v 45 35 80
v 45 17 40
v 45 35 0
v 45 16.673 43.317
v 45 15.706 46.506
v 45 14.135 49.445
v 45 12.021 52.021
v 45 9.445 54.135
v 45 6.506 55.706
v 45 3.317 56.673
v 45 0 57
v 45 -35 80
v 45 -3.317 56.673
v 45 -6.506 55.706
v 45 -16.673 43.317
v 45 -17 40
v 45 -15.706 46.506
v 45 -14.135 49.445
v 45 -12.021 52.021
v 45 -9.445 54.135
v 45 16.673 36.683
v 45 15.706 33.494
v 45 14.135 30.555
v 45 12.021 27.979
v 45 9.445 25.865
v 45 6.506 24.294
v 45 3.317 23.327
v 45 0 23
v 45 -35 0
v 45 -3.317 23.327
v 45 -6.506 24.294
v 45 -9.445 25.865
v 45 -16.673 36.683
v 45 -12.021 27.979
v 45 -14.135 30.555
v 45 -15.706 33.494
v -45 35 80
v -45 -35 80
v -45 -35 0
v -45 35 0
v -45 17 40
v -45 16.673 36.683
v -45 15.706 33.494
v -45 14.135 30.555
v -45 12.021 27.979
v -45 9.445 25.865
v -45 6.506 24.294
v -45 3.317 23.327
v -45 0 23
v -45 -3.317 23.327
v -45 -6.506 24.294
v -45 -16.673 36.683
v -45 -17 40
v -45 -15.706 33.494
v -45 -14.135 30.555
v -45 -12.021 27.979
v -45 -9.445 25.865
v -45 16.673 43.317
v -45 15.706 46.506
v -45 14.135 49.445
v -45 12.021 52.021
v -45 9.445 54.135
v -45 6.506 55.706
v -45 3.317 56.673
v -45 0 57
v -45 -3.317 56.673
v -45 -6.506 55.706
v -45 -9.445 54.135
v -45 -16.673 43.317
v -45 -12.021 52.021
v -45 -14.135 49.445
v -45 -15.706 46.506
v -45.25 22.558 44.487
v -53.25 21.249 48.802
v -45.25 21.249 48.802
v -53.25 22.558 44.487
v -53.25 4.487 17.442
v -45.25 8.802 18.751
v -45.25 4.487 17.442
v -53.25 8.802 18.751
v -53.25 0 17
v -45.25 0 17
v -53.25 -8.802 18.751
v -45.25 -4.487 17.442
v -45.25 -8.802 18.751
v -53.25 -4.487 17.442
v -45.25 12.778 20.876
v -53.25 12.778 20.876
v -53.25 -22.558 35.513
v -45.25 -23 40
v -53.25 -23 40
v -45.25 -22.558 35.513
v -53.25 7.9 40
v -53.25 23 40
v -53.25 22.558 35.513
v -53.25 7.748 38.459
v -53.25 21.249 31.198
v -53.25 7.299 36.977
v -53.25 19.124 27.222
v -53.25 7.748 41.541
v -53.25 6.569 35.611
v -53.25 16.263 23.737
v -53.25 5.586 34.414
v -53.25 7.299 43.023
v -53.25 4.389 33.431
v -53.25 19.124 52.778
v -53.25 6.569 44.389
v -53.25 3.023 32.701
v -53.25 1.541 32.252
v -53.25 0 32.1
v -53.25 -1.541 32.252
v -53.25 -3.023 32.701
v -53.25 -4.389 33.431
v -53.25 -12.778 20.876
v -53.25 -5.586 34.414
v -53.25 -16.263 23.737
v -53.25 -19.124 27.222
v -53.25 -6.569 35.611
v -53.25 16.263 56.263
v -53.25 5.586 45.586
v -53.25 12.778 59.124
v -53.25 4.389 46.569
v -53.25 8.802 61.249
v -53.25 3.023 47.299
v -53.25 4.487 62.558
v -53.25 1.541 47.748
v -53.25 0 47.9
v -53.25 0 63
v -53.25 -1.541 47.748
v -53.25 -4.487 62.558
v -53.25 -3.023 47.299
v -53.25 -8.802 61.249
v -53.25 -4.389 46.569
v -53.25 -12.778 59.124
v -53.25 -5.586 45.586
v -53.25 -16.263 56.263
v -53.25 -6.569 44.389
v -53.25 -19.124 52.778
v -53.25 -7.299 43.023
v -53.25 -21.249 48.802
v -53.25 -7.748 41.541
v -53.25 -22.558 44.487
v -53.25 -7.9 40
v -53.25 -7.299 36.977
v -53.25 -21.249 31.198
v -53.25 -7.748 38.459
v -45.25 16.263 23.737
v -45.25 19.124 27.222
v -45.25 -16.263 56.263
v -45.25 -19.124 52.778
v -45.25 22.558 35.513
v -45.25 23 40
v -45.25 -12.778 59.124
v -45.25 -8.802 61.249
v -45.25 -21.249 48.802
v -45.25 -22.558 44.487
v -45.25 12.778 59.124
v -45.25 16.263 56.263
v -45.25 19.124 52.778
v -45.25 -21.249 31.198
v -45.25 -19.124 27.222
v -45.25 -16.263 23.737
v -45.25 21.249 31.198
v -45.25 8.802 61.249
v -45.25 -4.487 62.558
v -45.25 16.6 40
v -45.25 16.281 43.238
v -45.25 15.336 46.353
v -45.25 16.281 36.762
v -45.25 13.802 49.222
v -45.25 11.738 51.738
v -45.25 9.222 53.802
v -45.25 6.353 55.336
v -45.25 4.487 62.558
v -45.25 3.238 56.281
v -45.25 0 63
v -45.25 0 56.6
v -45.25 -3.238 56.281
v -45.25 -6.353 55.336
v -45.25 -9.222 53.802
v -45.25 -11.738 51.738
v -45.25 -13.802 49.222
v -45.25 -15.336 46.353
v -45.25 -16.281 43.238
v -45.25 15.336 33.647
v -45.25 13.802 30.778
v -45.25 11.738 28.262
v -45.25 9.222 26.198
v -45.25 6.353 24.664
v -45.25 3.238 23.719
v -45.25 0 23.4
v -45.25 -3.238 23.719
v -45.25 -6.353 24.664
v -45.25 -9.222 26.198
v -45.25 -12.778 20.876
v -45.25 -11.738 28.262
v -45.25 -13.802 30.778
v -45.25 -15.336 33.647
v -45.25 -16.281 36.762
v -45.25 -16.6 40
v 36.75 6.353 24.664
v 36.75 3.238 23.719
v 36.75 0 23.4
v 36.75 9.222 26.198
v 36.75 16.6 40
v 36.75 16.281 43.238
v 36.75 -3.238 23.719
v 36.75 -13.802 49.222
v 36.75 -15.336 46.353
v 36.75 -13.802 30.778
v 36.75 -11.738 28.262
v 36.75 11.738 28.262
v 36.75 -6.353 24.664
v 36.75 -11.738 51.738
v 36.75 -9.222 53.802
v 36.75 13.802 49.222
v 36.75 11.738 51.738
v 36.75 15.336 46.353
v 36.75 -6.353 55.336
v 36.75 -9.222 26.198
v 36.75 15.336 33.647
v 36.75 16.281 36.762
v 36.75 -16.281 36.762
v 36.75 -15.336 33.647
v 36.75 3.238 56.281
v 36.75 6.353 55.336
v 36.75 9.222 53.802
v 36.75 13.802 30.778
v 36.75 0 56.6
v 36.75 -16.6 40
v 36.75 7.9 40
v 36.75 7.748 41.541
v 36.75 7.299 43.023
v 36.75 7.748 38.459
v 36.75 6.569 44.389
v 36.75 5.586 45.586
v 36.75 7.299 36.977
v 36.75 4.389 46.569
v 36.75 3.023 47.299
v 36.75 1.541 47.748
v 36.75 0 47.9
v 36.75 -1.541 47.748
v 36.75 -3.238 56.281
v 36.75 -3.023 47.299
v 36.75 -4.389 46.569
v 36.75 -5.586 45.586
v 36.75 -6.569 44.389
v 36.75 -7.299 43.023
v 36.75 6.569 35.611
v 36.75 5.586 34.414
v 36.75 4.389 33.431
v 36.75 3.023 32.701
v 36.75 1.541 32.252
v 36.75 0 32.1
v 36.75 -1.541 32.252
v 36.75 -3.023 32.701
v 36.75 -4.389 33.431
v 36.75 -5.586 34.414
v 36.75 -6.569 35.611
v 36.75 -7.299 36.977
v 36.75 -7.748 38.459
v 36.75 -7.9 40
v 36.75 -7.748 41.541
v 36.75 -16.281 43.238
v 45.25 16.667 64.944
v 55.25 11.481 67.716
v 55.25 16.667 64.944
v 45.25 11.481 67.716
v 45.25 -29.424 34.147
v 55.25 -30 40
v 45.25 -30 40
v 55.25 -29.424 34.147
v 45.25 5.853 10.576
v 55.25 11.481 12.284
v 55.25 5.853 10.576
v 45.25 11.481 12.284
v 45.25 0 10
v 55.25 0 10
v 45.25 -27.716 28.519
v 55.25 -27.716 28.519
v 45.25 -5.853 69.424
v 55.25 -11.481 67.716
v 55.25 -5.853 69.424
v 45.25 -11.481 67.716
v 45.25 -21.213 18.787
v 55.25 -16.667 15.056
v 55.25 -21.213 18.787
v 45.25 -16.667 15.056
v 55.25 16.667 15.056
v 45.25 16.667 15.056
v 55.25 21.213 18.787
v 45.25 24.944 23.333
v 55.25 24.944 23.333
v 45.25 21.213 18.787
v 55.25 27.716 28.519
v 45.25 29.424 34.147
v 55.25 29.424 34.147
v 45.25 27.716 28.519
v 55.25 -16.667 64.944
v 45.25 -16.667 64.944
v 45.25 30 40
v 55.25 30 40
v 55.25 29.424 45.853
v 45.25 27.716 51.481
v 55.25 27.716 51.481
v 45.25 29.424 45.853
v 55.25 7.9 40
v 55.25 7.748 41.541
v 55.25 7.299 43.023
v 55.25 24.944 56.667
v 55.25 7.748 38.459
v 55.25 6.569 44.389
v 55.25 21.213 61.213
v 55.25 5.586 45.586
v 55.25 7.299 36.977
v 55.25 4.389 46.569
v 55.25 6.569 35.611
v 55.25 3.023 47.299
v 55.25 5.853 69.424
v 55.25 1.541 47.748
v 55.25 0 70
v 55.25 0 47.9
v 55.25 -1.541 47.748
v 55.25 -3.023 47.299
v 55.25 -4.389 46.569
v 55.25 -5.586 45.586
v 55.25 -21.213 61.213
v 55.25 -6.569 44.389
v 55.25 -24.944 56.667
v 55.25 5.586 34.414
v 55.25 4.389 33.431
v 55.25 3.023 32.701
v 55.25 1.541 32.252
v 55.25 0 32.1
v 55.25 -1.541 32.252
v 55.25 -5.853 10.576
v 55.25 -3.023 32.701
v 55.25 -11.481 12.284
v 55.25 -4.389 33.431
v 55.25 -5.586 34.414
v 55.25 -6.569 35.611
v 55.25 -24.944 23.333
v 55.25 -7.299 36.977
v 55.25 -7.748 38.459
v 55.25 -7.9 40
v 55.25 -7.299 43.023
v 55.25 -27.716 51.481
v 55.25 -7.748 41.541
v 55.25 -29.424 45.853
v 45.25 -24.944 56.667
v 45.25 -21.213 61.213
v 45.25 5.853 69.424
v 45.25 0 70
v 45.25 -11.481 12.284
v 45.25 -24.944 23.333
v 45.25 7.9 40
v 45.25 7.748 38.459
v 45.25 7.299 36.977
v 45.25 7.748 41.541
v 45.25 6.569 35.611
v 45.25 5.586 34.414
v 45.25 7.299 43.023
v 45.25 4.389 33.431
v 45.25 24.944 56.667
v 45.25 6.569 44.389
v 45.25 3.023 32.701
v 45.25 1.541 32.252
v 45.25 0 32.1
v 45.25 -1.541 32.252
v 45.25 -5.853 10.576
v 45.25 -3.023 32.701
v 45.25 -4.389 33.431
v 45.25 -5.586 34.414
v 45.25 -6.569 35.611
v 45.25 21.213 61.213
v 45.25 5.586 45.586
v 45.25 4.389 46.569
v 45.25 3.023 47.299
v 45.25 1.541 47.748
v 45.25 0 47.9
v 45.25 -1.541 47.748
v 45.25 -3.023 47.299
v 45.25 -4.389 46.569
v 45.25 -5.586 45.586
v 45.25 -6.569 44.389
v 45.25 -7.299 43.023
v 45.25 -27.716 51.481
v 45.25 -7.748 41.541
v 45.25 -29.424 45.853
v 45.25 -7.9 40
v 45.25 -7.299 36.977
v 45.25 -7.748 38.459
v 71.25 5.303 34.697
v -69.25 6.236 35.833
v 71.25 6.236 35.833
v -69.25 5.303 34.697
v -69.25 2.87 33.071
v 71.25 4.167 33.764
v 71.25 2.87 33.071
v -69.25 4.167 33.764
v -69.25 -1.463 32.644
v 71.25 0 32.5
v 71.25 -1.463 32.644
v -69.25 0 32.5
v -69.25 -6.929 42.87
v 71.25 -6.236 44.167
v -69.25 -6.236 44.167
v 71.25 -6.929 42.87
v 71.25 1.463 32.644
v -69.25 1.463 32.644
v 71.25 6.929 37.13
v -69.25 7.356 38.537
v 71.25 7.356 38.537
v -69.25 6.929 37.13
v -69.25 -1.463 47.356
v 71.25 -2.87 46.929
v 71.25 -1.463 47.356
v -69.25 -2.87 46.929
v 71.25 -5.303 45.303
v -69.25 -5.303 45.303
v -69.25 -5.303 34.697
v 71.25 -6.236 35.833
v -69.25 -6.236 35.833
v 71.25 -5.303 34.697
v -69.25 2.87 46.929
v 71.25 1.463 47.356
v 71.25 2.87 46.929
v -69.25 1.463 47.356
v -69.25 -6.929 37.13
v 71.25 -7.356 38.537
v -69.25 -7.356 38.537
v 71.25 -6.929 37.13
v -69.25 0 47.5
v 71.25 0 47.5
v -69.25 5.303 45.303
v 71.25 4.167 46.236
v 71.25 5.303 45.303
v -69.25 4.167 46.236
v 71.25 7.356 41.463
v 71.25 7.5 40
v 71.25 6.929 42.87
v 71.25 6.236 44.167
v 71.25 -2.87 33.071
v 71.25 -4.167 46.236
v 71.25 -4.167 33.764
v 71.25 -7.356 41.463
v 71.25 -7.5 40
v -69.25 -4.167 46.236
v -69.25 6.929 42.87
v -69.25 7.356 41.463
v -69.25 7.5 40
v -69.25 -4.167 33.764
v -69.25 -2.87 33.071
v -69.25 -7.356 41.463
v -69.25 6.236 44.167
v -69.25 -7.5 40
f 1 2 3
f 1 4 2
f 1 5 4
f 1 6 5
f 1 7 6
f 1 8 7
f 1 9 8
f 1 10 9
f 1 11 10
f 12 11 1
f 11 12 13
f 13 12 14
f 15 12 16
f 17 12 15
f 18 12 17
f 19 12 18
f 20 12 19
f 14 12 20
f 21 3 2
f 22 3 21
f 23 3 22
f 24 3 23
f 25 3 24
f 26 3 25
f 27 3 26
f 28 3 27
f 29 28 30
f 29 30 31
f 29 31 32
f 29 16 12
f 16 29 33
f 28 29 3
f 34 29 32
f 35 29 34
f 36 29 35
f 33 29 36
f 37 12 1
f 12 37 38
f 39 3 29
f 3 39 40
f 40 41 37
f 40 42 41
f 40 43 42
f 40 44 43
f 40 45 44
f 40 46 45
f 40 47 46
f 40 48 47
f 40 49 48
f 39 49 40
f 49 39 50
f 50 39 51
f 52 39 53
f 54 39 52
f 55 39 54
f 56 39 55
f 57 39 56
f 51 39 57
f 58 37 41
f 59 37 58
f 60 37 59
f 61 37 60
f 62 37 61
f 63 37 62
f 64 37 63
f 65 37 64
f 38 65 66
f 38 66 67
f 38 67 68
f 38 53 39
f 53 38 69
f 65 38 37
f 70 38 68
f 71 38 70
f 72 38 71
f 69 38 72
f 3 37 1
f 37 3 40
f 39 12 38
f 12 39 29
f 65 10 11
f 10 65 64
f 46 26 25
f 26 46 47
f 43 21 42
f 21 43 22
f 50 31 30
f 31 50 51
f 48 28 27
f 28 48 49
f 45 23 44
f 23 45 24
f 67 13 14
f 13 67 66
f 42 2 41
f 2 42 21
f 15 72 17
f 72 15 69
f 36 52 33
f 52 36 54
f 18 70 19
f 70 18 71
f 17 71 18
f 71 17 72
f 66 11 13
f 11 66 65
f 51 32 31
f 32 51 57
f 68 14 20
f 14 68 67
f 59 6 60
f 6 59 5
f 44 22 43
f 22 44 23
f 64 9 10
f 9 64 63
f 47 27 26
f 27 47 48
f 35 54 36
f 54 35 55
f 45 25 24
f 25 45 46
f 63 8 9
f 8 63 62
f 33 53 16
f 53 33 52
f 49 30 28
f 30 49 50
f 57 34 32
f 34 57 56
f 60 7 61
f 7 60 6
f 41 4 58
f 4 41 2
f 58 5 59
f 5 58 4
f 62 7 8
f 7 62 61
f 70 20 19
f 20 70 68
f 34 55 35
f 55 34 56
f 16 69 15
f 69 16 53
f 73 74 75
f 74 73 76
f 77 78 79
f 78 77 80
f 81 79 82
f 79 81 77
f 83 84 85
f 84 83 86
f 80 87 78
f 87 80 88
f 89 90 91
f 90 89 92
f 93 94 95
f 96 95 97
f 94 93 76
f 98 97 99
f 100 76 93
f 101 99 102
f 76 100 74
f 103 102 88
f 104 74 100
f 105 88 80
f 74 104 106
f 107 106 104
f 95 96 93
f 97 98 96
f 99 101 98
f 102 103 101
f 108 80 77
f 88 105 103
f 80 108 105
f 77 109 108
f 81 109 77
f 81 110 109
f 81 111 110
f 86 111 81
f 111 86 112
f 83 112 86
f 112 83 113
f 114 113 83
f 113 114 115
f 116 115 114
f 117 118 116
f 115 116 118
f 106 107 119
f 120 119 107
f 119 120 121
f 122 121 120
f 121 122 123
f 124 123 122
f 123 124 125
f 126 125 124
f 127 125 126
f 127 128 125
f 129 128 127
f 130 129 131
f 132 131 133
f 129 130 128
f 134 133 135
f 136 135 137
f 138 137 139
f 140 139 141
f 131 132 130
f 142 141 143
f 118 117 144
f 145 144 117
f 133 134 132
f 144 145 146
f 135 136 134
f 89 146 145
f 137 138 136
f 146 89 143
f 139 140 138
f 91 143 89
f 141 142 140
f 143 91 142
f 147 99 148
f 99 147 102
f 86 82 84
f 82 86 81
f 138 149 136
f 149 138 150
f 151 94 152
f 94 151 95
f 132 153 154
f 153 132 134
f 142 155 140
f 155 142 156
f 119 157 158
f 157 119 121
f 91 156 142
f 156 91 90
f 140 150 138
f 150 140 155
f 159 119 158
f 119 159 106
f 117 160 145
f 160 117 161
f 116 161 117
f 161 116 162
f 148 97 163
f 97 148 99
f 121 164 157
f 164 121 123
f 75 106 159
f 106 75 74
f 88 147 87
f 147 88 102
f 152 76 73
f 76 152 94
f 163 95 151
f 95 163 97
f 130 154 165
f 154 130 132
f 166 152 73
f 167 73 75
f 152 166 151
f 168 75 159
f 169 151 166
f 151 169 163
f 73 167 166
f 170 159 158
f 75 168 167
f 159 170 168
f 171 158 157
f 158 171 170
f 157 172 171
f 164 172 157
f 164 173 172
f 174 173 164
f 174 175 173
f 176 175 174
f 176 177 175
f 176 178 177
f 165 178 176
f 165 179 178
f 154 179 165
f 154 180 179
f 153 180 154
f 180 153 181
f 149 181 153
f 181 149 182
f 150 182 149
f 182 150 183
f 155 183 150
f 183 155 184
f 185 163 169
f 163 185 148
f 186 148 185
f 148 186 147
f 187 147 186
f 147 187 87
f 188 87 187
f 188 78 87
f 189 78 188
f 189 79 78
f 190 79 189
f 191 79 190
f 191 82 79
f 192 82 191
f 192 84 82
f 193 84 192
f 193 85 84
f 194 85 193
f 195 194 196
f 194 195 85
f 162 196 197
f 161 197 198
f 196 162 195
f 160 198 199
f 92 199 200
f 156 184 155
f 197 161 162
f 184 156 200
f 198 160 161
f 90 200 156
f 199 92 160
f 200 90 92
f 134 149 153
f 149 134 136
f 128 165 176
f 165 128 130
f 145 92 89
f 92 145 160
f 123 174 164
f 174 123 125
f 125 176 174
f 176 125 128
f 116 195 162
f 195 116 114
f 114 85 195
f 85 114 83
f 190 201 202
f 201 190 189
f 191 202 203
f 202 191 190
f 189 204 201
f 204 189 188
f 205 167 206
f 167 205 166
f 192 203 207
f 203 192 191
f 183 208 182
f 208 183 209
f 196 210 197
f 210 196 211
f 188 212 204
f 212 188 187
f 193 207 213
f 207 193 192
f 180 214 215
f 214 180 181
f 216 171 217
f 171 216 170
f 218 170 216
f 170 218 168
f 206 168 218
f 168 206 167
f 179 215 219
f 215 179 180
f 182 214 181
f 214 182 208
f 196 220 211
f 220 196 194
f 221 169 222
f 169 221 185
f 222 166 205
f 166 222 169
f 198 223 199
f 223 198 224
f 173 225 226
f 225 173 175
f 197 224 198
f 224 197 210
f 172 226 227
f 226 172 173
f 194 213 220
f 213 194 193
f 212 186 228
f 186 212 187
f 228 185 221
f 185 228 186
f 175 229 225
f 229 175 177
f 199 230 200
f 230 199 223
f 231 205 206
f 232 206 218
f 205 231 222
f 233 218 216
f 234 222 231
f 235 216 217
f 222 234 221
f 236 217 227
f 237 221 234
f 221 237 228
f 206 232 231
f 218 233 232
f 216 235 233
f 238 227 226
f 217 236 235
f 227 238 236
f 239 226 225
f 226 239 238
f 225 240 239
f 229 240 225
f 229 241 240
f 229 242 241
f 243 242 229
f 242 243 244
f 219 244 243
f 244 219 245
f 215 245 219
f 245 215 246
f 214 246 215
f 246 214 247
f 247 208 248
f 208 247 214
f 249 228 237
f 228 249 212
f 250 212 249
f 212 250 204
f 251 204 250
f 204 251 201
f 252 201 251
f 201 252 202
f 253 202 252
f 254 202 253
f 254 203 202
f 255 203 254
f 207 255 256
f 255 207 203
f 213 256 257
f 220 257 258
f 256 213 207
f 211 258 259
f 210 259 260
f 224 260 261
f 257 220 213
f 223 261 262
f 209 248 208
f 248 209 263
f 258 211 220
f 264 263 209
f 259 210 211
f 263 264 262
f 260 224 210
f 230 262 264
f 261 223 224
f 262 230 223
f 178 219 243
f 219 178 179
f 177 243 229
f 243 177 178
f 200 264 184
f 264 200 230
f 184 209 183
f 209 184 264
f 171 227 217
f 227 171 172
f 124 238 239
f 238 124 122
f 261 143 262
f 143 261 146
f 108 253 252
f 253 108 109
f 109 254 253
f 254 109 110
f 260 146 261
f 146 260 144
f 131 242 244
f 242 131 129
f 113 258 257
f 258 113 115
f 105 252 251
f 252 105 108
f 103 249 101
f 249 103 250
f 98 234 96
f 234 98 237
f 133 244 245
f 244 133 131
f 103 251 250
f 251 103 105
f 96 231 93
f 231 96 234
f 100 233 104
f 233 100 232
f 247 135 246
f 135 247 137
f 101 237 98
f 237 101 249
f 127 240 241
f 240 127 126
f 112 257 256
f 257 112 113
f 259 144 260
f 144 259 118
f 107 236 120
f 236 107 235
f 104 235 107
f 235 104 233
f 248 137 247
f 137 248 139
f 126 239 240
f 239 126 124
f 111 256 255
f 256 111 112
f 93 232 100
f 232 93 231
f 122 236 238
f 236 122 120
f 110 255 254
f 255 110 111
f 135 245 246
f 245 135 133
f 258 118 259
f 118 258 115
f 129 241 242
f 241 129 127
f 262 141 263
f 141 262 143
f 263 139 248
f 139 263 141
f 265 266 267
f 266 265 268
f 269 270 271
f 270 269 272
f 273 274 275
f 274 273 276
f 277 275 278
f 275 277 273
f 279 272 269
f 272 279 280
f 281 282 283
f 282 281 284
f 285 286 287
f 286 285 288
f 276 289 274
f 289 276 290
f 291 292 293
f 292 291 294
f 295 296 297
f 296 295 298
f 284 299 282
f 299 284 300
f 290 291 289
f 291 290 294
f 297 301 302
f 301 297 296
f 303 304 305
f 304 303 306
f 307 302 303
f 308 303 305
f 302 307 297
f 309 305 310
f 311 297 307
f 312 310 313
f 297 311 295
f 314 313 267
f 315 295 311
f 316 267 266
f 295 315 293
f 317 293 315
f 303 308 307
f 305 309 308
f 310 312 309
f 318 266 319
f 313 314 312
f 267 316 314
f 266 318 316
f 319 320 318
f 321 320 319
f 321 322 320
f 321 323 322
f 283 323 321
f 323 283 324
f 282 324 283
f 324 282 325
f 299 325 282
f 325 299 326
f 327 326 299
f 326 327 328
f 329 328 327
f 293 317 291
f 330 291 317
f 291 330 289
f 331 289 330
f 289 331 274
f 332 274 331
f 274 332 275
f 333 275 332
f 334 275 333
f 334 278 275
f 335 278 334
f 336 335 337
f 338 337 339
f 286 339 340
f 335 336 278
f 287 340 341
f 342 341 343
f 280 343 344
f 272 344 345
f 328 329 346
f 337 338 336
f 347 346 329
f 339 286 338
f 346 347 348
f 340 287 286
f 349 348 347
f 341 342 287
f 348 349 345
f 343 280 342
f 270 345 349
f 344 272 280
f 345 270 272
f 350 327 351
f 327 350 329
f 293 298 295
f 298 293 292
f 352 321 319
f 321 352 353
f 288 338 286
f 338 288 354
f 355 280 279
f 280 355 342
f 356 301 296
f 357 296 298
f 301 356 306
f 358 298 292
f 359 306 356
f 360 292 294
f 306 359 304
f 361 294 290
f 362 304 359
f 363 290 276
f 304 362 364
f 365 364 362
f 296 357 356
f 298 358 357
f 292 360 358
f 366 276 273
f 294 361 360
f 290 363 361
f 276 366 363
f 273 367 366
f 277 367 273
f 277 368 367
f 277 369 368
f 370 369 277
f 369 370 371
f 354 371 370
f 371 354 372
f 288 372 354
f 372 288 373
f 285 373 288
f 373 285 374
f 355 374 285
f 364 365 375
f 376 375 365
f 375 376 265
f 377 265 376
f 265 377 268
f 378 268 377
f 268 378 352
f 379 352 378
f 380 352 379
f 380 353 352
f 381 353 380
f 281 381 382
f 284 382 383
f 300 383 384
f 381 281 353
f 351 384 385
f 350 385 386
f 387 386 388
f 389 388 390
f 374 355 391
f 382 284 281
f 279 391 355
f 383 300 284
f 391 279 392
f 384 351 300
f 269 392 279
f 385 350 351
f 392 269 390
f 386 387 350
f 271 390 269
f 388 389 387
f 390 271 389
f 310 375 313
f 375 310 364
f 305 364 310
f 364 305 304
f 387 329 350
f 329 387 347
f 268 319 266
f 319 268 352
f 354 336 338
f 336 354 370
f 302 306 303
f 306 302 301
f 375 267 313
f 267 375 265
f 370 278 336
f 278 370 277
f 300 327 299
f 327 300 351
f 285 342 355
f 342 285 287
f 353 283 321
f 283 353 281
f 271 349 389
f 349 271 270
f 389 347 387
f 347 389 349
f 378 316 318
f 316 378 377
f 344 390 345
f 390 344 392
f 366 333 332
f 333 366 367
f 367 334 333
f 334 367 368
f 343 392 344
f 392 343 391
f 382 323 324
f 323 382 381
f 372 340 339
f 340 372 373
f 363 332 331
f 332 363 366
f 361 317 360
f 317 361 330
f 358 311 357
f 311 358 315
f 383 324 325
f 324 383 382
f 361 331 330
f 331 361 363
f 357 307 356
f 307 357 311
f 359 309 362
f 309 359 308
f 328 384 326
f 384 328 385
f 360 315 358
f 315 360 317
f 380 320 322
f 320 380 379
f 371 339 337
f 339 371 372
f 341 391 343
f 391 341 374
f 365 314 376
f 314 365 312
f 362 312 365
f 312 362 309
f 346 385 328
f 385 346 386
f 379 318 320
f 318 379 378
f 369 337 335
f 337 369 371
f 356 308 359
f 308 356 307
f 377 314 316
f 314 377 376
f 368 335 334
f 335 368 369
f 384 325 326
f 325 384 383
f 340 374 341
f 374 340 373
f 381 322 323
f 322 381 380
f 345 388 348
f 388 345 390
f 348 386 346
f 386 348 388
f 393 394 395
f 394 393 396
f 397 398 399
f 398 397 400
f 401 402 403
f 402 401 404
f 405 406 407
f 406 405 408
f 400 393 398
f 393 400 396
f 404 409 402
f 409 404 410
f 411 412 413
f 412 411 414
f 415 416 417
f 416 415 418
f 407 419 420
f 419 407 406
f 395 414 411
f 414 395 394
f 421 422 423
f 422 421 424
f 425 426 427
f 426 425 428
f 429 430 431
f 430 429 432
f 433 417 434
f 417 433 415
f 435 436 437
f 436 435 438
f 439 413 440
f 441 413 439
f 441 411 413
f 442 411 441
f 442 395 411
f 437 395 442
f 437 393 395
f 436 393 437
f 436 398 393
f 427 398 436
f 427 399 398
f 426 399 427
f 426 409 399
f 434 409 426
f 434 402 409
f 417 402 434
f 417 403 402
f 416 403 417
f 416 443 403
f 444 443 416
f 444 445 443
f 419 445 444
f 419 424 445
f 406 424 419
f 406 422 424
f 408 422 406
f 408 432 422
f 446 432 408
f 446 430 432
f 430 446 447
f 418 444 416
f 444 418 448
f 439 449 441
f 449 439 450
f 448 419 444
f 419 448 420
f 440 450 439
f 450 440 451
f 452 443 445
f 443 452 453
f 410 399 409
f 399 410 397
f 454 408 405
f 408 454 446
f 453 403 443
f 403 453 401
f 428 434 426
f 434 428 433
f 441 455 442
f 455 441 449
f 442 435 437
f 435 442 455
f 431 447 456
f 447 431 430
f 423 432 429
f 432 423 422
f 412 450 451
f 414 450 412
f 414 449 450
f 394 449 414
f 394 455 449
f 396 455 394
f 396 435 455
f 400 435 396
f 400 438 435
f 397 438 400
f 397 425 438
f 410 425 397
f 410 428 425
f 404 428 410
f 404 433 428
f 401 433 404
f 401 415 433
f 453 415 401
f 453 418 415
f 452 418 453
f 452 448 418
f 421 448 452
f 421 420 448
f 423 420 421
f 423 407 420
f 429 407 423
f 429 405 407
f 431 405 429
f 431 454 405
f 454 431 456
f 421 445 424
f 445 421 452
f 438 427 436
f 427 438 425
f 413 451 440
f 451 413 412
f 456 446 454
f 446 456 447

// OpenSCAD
$fn = 32;

// ------------------------------------------------------------------------
// Bushed housing: 90 x 70 x 80 mm housing, bushing d33.2
// Every part is its own module, assembly() places them once.
// ------------------------------------------------------------------------

// --- part 1 ---
module housing() {
  difference() {
    translate([-45, -35, 0]) cube([90, 70, 80]);
    translate([0, 0, 40]) rotate([0, 90, 0]) cylinder(h = 92, d = 34, center = true);
  }
}

// --- part 2 ---
module bushing() {
  difference() {
    union() {
      cylinder(h = 8, d = 46);
      translate([0, 0, 8]) cylinder(h = 82, d = 33.2);
    }
    translate([0, 0, -1]) cylinder(h = 92, d = 15.8);
  }
}

// --- part 3 ---
module shaft() {
  translate([0, 0, -70.25]) cylinder(h = 140.5, d = 15);
}

// --- part 4 ---
module cover() {
  difference() {
    cylinder(h = 10, d = 60);
    translate([0, 0, -1]) cylinder(h = 12, d = 15.8);
  }
}

// --- assembly ---
module assembly() {
  translate([0, 0, 0]) rotate([0, 0, 0]) housing();
  translate([-53.25, 0, 40]) rotate([0, 90, 0]) bushing();
  translate([1, 0, 40]) rotate([0, 90, 0]) shaft();
  translate([45.25, 0, 40]) rotate([0, 90, 0]) cover();
}

assembly();
